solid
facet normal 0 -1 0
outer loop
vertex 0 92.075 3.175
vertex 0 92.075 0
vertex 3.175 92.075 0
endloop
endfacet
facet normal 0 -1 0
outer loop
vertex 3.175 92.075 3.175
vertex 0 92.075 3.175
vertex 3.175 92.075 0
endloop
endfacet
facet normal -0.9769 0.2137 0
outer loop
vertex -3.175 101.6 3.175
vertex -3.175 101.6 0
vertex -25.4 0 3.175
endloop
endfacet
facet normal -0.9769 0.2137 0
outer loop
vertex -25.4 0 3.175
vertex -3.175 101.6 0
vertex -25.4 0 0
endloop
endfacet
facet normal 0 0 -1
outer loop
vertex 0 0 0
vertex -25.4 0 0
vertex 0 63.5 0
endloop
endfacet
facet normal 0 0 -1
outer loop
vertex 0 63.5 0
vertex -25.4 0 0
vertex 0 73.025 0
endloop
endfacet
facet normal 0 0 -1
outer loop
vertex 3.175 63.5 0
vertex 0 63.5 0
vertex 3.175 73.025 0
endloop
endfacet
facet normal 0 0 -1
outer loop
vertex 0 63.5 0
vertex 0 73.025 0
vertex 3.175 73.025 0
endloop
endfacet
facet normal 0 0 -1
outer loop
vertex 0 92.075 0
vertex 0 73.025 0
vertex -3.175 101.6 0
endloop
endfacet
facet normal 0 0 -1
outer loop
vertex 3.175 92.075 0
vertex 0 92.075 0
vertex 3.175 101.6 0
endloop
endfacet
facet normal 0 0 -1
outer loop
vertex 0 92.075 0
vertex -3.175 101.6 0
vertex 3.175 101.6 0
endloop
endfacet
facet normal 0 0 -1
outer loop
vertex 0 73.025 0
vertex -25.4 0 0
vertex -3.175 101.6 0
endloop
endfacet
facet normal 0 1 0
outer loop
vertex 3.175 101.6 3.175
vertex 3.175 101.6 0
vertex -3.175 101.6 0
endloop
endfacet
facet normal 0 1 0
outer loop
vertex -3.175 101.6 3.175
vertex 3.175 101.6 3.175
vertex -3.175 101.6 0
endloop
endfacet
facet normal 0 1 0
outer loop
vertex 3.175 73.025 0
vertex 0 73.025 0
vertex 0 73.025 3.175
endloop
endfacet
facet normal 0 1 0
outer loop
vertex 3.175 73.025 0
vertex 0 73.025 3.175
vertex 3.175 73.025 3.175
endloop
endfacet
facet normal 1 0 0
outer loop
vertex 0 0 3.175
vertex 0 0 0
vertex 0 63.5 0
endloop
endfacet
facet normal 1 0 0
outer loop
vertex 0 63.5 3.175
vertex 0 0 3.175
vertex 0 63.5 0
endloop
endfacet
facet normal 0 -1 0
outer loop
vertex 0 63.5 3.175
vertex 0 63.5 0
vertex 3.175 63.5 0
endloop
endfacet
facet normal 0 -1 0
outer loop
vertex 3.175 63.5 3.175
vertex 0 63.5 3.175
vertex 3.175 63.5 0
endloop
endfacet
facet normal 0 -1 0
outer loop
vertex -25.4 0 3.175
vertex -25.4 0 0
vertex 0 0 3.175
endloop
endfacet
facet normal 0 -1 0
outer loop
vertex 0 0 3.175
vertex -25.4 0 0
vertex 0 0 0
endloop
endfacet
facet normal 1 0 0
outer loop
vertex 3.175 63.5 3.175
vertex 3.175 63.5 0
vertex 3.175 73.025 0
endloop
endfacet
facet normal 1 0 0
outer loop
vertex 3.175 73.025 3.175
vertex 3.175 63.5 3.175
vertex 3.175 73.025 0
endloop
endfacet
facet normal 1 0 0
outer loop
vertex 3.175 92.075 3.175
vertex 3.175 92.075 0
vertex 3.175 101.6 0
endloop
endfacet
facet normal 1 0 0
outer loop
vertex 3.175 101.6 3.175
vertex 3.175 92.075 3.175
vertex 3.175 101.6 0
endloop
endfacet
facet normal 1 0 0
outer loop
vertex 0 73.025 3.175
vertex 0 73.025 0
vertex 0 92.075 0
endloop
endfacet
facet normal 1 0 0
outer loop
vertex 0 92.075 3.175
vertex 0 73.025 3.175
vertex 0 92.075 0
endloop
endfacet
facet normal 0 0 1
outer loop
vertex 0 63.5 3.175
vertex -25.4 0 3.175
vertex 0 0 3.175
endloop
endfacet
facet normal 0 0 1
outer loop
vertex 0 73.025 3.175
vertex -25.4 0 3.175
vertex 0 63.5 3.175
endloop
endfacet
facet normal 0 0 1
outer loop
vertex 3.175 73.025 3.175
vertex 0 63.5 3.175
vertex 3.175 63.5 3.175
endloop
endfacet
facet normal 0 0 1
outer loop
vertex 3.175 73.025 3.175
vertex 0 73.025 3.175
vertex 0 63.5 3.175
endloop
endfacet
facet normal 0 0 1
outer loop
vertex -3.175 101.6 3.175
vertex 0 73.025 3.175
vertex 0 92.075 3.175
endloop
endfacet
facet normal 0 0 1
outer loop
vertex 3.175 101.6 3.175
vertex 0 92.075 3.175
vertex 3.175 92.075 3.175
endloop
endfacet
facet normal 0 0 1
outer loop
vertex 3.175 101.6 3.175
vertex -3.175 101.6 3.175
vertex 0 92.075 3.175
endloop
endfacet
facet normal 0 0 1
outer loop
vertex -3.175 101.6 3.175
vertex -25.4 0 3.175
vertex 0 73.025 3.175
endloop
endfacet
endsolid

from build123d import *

# Parameters (mm, degrees)
SKETCH1_W           = 3.175
SKETCH1_H           = 9.525
BOSS_EXTRUDE1_DEPTH = 3.175


with BuildPart() as part:
    # Sketch1 → Boss-Extrude1 (new body)
    with BuildSketch(Plane.XY):
        Polygon((0, 101.6), (-3.175, 101.6), (-25.4, 0), (0, 0), align=None)
        with Locations((1.5875, 68.2625)):
            Rectangle(SKETCH1_W, SKETCH1_H)
        with Locations((1.5875, 96.8375)):
            Rectangle(SKETCH1_W, SKETCH1_H)
    extrude(amount=BOSS_EXTRUDE1_DEPTH)


solid = part.part
